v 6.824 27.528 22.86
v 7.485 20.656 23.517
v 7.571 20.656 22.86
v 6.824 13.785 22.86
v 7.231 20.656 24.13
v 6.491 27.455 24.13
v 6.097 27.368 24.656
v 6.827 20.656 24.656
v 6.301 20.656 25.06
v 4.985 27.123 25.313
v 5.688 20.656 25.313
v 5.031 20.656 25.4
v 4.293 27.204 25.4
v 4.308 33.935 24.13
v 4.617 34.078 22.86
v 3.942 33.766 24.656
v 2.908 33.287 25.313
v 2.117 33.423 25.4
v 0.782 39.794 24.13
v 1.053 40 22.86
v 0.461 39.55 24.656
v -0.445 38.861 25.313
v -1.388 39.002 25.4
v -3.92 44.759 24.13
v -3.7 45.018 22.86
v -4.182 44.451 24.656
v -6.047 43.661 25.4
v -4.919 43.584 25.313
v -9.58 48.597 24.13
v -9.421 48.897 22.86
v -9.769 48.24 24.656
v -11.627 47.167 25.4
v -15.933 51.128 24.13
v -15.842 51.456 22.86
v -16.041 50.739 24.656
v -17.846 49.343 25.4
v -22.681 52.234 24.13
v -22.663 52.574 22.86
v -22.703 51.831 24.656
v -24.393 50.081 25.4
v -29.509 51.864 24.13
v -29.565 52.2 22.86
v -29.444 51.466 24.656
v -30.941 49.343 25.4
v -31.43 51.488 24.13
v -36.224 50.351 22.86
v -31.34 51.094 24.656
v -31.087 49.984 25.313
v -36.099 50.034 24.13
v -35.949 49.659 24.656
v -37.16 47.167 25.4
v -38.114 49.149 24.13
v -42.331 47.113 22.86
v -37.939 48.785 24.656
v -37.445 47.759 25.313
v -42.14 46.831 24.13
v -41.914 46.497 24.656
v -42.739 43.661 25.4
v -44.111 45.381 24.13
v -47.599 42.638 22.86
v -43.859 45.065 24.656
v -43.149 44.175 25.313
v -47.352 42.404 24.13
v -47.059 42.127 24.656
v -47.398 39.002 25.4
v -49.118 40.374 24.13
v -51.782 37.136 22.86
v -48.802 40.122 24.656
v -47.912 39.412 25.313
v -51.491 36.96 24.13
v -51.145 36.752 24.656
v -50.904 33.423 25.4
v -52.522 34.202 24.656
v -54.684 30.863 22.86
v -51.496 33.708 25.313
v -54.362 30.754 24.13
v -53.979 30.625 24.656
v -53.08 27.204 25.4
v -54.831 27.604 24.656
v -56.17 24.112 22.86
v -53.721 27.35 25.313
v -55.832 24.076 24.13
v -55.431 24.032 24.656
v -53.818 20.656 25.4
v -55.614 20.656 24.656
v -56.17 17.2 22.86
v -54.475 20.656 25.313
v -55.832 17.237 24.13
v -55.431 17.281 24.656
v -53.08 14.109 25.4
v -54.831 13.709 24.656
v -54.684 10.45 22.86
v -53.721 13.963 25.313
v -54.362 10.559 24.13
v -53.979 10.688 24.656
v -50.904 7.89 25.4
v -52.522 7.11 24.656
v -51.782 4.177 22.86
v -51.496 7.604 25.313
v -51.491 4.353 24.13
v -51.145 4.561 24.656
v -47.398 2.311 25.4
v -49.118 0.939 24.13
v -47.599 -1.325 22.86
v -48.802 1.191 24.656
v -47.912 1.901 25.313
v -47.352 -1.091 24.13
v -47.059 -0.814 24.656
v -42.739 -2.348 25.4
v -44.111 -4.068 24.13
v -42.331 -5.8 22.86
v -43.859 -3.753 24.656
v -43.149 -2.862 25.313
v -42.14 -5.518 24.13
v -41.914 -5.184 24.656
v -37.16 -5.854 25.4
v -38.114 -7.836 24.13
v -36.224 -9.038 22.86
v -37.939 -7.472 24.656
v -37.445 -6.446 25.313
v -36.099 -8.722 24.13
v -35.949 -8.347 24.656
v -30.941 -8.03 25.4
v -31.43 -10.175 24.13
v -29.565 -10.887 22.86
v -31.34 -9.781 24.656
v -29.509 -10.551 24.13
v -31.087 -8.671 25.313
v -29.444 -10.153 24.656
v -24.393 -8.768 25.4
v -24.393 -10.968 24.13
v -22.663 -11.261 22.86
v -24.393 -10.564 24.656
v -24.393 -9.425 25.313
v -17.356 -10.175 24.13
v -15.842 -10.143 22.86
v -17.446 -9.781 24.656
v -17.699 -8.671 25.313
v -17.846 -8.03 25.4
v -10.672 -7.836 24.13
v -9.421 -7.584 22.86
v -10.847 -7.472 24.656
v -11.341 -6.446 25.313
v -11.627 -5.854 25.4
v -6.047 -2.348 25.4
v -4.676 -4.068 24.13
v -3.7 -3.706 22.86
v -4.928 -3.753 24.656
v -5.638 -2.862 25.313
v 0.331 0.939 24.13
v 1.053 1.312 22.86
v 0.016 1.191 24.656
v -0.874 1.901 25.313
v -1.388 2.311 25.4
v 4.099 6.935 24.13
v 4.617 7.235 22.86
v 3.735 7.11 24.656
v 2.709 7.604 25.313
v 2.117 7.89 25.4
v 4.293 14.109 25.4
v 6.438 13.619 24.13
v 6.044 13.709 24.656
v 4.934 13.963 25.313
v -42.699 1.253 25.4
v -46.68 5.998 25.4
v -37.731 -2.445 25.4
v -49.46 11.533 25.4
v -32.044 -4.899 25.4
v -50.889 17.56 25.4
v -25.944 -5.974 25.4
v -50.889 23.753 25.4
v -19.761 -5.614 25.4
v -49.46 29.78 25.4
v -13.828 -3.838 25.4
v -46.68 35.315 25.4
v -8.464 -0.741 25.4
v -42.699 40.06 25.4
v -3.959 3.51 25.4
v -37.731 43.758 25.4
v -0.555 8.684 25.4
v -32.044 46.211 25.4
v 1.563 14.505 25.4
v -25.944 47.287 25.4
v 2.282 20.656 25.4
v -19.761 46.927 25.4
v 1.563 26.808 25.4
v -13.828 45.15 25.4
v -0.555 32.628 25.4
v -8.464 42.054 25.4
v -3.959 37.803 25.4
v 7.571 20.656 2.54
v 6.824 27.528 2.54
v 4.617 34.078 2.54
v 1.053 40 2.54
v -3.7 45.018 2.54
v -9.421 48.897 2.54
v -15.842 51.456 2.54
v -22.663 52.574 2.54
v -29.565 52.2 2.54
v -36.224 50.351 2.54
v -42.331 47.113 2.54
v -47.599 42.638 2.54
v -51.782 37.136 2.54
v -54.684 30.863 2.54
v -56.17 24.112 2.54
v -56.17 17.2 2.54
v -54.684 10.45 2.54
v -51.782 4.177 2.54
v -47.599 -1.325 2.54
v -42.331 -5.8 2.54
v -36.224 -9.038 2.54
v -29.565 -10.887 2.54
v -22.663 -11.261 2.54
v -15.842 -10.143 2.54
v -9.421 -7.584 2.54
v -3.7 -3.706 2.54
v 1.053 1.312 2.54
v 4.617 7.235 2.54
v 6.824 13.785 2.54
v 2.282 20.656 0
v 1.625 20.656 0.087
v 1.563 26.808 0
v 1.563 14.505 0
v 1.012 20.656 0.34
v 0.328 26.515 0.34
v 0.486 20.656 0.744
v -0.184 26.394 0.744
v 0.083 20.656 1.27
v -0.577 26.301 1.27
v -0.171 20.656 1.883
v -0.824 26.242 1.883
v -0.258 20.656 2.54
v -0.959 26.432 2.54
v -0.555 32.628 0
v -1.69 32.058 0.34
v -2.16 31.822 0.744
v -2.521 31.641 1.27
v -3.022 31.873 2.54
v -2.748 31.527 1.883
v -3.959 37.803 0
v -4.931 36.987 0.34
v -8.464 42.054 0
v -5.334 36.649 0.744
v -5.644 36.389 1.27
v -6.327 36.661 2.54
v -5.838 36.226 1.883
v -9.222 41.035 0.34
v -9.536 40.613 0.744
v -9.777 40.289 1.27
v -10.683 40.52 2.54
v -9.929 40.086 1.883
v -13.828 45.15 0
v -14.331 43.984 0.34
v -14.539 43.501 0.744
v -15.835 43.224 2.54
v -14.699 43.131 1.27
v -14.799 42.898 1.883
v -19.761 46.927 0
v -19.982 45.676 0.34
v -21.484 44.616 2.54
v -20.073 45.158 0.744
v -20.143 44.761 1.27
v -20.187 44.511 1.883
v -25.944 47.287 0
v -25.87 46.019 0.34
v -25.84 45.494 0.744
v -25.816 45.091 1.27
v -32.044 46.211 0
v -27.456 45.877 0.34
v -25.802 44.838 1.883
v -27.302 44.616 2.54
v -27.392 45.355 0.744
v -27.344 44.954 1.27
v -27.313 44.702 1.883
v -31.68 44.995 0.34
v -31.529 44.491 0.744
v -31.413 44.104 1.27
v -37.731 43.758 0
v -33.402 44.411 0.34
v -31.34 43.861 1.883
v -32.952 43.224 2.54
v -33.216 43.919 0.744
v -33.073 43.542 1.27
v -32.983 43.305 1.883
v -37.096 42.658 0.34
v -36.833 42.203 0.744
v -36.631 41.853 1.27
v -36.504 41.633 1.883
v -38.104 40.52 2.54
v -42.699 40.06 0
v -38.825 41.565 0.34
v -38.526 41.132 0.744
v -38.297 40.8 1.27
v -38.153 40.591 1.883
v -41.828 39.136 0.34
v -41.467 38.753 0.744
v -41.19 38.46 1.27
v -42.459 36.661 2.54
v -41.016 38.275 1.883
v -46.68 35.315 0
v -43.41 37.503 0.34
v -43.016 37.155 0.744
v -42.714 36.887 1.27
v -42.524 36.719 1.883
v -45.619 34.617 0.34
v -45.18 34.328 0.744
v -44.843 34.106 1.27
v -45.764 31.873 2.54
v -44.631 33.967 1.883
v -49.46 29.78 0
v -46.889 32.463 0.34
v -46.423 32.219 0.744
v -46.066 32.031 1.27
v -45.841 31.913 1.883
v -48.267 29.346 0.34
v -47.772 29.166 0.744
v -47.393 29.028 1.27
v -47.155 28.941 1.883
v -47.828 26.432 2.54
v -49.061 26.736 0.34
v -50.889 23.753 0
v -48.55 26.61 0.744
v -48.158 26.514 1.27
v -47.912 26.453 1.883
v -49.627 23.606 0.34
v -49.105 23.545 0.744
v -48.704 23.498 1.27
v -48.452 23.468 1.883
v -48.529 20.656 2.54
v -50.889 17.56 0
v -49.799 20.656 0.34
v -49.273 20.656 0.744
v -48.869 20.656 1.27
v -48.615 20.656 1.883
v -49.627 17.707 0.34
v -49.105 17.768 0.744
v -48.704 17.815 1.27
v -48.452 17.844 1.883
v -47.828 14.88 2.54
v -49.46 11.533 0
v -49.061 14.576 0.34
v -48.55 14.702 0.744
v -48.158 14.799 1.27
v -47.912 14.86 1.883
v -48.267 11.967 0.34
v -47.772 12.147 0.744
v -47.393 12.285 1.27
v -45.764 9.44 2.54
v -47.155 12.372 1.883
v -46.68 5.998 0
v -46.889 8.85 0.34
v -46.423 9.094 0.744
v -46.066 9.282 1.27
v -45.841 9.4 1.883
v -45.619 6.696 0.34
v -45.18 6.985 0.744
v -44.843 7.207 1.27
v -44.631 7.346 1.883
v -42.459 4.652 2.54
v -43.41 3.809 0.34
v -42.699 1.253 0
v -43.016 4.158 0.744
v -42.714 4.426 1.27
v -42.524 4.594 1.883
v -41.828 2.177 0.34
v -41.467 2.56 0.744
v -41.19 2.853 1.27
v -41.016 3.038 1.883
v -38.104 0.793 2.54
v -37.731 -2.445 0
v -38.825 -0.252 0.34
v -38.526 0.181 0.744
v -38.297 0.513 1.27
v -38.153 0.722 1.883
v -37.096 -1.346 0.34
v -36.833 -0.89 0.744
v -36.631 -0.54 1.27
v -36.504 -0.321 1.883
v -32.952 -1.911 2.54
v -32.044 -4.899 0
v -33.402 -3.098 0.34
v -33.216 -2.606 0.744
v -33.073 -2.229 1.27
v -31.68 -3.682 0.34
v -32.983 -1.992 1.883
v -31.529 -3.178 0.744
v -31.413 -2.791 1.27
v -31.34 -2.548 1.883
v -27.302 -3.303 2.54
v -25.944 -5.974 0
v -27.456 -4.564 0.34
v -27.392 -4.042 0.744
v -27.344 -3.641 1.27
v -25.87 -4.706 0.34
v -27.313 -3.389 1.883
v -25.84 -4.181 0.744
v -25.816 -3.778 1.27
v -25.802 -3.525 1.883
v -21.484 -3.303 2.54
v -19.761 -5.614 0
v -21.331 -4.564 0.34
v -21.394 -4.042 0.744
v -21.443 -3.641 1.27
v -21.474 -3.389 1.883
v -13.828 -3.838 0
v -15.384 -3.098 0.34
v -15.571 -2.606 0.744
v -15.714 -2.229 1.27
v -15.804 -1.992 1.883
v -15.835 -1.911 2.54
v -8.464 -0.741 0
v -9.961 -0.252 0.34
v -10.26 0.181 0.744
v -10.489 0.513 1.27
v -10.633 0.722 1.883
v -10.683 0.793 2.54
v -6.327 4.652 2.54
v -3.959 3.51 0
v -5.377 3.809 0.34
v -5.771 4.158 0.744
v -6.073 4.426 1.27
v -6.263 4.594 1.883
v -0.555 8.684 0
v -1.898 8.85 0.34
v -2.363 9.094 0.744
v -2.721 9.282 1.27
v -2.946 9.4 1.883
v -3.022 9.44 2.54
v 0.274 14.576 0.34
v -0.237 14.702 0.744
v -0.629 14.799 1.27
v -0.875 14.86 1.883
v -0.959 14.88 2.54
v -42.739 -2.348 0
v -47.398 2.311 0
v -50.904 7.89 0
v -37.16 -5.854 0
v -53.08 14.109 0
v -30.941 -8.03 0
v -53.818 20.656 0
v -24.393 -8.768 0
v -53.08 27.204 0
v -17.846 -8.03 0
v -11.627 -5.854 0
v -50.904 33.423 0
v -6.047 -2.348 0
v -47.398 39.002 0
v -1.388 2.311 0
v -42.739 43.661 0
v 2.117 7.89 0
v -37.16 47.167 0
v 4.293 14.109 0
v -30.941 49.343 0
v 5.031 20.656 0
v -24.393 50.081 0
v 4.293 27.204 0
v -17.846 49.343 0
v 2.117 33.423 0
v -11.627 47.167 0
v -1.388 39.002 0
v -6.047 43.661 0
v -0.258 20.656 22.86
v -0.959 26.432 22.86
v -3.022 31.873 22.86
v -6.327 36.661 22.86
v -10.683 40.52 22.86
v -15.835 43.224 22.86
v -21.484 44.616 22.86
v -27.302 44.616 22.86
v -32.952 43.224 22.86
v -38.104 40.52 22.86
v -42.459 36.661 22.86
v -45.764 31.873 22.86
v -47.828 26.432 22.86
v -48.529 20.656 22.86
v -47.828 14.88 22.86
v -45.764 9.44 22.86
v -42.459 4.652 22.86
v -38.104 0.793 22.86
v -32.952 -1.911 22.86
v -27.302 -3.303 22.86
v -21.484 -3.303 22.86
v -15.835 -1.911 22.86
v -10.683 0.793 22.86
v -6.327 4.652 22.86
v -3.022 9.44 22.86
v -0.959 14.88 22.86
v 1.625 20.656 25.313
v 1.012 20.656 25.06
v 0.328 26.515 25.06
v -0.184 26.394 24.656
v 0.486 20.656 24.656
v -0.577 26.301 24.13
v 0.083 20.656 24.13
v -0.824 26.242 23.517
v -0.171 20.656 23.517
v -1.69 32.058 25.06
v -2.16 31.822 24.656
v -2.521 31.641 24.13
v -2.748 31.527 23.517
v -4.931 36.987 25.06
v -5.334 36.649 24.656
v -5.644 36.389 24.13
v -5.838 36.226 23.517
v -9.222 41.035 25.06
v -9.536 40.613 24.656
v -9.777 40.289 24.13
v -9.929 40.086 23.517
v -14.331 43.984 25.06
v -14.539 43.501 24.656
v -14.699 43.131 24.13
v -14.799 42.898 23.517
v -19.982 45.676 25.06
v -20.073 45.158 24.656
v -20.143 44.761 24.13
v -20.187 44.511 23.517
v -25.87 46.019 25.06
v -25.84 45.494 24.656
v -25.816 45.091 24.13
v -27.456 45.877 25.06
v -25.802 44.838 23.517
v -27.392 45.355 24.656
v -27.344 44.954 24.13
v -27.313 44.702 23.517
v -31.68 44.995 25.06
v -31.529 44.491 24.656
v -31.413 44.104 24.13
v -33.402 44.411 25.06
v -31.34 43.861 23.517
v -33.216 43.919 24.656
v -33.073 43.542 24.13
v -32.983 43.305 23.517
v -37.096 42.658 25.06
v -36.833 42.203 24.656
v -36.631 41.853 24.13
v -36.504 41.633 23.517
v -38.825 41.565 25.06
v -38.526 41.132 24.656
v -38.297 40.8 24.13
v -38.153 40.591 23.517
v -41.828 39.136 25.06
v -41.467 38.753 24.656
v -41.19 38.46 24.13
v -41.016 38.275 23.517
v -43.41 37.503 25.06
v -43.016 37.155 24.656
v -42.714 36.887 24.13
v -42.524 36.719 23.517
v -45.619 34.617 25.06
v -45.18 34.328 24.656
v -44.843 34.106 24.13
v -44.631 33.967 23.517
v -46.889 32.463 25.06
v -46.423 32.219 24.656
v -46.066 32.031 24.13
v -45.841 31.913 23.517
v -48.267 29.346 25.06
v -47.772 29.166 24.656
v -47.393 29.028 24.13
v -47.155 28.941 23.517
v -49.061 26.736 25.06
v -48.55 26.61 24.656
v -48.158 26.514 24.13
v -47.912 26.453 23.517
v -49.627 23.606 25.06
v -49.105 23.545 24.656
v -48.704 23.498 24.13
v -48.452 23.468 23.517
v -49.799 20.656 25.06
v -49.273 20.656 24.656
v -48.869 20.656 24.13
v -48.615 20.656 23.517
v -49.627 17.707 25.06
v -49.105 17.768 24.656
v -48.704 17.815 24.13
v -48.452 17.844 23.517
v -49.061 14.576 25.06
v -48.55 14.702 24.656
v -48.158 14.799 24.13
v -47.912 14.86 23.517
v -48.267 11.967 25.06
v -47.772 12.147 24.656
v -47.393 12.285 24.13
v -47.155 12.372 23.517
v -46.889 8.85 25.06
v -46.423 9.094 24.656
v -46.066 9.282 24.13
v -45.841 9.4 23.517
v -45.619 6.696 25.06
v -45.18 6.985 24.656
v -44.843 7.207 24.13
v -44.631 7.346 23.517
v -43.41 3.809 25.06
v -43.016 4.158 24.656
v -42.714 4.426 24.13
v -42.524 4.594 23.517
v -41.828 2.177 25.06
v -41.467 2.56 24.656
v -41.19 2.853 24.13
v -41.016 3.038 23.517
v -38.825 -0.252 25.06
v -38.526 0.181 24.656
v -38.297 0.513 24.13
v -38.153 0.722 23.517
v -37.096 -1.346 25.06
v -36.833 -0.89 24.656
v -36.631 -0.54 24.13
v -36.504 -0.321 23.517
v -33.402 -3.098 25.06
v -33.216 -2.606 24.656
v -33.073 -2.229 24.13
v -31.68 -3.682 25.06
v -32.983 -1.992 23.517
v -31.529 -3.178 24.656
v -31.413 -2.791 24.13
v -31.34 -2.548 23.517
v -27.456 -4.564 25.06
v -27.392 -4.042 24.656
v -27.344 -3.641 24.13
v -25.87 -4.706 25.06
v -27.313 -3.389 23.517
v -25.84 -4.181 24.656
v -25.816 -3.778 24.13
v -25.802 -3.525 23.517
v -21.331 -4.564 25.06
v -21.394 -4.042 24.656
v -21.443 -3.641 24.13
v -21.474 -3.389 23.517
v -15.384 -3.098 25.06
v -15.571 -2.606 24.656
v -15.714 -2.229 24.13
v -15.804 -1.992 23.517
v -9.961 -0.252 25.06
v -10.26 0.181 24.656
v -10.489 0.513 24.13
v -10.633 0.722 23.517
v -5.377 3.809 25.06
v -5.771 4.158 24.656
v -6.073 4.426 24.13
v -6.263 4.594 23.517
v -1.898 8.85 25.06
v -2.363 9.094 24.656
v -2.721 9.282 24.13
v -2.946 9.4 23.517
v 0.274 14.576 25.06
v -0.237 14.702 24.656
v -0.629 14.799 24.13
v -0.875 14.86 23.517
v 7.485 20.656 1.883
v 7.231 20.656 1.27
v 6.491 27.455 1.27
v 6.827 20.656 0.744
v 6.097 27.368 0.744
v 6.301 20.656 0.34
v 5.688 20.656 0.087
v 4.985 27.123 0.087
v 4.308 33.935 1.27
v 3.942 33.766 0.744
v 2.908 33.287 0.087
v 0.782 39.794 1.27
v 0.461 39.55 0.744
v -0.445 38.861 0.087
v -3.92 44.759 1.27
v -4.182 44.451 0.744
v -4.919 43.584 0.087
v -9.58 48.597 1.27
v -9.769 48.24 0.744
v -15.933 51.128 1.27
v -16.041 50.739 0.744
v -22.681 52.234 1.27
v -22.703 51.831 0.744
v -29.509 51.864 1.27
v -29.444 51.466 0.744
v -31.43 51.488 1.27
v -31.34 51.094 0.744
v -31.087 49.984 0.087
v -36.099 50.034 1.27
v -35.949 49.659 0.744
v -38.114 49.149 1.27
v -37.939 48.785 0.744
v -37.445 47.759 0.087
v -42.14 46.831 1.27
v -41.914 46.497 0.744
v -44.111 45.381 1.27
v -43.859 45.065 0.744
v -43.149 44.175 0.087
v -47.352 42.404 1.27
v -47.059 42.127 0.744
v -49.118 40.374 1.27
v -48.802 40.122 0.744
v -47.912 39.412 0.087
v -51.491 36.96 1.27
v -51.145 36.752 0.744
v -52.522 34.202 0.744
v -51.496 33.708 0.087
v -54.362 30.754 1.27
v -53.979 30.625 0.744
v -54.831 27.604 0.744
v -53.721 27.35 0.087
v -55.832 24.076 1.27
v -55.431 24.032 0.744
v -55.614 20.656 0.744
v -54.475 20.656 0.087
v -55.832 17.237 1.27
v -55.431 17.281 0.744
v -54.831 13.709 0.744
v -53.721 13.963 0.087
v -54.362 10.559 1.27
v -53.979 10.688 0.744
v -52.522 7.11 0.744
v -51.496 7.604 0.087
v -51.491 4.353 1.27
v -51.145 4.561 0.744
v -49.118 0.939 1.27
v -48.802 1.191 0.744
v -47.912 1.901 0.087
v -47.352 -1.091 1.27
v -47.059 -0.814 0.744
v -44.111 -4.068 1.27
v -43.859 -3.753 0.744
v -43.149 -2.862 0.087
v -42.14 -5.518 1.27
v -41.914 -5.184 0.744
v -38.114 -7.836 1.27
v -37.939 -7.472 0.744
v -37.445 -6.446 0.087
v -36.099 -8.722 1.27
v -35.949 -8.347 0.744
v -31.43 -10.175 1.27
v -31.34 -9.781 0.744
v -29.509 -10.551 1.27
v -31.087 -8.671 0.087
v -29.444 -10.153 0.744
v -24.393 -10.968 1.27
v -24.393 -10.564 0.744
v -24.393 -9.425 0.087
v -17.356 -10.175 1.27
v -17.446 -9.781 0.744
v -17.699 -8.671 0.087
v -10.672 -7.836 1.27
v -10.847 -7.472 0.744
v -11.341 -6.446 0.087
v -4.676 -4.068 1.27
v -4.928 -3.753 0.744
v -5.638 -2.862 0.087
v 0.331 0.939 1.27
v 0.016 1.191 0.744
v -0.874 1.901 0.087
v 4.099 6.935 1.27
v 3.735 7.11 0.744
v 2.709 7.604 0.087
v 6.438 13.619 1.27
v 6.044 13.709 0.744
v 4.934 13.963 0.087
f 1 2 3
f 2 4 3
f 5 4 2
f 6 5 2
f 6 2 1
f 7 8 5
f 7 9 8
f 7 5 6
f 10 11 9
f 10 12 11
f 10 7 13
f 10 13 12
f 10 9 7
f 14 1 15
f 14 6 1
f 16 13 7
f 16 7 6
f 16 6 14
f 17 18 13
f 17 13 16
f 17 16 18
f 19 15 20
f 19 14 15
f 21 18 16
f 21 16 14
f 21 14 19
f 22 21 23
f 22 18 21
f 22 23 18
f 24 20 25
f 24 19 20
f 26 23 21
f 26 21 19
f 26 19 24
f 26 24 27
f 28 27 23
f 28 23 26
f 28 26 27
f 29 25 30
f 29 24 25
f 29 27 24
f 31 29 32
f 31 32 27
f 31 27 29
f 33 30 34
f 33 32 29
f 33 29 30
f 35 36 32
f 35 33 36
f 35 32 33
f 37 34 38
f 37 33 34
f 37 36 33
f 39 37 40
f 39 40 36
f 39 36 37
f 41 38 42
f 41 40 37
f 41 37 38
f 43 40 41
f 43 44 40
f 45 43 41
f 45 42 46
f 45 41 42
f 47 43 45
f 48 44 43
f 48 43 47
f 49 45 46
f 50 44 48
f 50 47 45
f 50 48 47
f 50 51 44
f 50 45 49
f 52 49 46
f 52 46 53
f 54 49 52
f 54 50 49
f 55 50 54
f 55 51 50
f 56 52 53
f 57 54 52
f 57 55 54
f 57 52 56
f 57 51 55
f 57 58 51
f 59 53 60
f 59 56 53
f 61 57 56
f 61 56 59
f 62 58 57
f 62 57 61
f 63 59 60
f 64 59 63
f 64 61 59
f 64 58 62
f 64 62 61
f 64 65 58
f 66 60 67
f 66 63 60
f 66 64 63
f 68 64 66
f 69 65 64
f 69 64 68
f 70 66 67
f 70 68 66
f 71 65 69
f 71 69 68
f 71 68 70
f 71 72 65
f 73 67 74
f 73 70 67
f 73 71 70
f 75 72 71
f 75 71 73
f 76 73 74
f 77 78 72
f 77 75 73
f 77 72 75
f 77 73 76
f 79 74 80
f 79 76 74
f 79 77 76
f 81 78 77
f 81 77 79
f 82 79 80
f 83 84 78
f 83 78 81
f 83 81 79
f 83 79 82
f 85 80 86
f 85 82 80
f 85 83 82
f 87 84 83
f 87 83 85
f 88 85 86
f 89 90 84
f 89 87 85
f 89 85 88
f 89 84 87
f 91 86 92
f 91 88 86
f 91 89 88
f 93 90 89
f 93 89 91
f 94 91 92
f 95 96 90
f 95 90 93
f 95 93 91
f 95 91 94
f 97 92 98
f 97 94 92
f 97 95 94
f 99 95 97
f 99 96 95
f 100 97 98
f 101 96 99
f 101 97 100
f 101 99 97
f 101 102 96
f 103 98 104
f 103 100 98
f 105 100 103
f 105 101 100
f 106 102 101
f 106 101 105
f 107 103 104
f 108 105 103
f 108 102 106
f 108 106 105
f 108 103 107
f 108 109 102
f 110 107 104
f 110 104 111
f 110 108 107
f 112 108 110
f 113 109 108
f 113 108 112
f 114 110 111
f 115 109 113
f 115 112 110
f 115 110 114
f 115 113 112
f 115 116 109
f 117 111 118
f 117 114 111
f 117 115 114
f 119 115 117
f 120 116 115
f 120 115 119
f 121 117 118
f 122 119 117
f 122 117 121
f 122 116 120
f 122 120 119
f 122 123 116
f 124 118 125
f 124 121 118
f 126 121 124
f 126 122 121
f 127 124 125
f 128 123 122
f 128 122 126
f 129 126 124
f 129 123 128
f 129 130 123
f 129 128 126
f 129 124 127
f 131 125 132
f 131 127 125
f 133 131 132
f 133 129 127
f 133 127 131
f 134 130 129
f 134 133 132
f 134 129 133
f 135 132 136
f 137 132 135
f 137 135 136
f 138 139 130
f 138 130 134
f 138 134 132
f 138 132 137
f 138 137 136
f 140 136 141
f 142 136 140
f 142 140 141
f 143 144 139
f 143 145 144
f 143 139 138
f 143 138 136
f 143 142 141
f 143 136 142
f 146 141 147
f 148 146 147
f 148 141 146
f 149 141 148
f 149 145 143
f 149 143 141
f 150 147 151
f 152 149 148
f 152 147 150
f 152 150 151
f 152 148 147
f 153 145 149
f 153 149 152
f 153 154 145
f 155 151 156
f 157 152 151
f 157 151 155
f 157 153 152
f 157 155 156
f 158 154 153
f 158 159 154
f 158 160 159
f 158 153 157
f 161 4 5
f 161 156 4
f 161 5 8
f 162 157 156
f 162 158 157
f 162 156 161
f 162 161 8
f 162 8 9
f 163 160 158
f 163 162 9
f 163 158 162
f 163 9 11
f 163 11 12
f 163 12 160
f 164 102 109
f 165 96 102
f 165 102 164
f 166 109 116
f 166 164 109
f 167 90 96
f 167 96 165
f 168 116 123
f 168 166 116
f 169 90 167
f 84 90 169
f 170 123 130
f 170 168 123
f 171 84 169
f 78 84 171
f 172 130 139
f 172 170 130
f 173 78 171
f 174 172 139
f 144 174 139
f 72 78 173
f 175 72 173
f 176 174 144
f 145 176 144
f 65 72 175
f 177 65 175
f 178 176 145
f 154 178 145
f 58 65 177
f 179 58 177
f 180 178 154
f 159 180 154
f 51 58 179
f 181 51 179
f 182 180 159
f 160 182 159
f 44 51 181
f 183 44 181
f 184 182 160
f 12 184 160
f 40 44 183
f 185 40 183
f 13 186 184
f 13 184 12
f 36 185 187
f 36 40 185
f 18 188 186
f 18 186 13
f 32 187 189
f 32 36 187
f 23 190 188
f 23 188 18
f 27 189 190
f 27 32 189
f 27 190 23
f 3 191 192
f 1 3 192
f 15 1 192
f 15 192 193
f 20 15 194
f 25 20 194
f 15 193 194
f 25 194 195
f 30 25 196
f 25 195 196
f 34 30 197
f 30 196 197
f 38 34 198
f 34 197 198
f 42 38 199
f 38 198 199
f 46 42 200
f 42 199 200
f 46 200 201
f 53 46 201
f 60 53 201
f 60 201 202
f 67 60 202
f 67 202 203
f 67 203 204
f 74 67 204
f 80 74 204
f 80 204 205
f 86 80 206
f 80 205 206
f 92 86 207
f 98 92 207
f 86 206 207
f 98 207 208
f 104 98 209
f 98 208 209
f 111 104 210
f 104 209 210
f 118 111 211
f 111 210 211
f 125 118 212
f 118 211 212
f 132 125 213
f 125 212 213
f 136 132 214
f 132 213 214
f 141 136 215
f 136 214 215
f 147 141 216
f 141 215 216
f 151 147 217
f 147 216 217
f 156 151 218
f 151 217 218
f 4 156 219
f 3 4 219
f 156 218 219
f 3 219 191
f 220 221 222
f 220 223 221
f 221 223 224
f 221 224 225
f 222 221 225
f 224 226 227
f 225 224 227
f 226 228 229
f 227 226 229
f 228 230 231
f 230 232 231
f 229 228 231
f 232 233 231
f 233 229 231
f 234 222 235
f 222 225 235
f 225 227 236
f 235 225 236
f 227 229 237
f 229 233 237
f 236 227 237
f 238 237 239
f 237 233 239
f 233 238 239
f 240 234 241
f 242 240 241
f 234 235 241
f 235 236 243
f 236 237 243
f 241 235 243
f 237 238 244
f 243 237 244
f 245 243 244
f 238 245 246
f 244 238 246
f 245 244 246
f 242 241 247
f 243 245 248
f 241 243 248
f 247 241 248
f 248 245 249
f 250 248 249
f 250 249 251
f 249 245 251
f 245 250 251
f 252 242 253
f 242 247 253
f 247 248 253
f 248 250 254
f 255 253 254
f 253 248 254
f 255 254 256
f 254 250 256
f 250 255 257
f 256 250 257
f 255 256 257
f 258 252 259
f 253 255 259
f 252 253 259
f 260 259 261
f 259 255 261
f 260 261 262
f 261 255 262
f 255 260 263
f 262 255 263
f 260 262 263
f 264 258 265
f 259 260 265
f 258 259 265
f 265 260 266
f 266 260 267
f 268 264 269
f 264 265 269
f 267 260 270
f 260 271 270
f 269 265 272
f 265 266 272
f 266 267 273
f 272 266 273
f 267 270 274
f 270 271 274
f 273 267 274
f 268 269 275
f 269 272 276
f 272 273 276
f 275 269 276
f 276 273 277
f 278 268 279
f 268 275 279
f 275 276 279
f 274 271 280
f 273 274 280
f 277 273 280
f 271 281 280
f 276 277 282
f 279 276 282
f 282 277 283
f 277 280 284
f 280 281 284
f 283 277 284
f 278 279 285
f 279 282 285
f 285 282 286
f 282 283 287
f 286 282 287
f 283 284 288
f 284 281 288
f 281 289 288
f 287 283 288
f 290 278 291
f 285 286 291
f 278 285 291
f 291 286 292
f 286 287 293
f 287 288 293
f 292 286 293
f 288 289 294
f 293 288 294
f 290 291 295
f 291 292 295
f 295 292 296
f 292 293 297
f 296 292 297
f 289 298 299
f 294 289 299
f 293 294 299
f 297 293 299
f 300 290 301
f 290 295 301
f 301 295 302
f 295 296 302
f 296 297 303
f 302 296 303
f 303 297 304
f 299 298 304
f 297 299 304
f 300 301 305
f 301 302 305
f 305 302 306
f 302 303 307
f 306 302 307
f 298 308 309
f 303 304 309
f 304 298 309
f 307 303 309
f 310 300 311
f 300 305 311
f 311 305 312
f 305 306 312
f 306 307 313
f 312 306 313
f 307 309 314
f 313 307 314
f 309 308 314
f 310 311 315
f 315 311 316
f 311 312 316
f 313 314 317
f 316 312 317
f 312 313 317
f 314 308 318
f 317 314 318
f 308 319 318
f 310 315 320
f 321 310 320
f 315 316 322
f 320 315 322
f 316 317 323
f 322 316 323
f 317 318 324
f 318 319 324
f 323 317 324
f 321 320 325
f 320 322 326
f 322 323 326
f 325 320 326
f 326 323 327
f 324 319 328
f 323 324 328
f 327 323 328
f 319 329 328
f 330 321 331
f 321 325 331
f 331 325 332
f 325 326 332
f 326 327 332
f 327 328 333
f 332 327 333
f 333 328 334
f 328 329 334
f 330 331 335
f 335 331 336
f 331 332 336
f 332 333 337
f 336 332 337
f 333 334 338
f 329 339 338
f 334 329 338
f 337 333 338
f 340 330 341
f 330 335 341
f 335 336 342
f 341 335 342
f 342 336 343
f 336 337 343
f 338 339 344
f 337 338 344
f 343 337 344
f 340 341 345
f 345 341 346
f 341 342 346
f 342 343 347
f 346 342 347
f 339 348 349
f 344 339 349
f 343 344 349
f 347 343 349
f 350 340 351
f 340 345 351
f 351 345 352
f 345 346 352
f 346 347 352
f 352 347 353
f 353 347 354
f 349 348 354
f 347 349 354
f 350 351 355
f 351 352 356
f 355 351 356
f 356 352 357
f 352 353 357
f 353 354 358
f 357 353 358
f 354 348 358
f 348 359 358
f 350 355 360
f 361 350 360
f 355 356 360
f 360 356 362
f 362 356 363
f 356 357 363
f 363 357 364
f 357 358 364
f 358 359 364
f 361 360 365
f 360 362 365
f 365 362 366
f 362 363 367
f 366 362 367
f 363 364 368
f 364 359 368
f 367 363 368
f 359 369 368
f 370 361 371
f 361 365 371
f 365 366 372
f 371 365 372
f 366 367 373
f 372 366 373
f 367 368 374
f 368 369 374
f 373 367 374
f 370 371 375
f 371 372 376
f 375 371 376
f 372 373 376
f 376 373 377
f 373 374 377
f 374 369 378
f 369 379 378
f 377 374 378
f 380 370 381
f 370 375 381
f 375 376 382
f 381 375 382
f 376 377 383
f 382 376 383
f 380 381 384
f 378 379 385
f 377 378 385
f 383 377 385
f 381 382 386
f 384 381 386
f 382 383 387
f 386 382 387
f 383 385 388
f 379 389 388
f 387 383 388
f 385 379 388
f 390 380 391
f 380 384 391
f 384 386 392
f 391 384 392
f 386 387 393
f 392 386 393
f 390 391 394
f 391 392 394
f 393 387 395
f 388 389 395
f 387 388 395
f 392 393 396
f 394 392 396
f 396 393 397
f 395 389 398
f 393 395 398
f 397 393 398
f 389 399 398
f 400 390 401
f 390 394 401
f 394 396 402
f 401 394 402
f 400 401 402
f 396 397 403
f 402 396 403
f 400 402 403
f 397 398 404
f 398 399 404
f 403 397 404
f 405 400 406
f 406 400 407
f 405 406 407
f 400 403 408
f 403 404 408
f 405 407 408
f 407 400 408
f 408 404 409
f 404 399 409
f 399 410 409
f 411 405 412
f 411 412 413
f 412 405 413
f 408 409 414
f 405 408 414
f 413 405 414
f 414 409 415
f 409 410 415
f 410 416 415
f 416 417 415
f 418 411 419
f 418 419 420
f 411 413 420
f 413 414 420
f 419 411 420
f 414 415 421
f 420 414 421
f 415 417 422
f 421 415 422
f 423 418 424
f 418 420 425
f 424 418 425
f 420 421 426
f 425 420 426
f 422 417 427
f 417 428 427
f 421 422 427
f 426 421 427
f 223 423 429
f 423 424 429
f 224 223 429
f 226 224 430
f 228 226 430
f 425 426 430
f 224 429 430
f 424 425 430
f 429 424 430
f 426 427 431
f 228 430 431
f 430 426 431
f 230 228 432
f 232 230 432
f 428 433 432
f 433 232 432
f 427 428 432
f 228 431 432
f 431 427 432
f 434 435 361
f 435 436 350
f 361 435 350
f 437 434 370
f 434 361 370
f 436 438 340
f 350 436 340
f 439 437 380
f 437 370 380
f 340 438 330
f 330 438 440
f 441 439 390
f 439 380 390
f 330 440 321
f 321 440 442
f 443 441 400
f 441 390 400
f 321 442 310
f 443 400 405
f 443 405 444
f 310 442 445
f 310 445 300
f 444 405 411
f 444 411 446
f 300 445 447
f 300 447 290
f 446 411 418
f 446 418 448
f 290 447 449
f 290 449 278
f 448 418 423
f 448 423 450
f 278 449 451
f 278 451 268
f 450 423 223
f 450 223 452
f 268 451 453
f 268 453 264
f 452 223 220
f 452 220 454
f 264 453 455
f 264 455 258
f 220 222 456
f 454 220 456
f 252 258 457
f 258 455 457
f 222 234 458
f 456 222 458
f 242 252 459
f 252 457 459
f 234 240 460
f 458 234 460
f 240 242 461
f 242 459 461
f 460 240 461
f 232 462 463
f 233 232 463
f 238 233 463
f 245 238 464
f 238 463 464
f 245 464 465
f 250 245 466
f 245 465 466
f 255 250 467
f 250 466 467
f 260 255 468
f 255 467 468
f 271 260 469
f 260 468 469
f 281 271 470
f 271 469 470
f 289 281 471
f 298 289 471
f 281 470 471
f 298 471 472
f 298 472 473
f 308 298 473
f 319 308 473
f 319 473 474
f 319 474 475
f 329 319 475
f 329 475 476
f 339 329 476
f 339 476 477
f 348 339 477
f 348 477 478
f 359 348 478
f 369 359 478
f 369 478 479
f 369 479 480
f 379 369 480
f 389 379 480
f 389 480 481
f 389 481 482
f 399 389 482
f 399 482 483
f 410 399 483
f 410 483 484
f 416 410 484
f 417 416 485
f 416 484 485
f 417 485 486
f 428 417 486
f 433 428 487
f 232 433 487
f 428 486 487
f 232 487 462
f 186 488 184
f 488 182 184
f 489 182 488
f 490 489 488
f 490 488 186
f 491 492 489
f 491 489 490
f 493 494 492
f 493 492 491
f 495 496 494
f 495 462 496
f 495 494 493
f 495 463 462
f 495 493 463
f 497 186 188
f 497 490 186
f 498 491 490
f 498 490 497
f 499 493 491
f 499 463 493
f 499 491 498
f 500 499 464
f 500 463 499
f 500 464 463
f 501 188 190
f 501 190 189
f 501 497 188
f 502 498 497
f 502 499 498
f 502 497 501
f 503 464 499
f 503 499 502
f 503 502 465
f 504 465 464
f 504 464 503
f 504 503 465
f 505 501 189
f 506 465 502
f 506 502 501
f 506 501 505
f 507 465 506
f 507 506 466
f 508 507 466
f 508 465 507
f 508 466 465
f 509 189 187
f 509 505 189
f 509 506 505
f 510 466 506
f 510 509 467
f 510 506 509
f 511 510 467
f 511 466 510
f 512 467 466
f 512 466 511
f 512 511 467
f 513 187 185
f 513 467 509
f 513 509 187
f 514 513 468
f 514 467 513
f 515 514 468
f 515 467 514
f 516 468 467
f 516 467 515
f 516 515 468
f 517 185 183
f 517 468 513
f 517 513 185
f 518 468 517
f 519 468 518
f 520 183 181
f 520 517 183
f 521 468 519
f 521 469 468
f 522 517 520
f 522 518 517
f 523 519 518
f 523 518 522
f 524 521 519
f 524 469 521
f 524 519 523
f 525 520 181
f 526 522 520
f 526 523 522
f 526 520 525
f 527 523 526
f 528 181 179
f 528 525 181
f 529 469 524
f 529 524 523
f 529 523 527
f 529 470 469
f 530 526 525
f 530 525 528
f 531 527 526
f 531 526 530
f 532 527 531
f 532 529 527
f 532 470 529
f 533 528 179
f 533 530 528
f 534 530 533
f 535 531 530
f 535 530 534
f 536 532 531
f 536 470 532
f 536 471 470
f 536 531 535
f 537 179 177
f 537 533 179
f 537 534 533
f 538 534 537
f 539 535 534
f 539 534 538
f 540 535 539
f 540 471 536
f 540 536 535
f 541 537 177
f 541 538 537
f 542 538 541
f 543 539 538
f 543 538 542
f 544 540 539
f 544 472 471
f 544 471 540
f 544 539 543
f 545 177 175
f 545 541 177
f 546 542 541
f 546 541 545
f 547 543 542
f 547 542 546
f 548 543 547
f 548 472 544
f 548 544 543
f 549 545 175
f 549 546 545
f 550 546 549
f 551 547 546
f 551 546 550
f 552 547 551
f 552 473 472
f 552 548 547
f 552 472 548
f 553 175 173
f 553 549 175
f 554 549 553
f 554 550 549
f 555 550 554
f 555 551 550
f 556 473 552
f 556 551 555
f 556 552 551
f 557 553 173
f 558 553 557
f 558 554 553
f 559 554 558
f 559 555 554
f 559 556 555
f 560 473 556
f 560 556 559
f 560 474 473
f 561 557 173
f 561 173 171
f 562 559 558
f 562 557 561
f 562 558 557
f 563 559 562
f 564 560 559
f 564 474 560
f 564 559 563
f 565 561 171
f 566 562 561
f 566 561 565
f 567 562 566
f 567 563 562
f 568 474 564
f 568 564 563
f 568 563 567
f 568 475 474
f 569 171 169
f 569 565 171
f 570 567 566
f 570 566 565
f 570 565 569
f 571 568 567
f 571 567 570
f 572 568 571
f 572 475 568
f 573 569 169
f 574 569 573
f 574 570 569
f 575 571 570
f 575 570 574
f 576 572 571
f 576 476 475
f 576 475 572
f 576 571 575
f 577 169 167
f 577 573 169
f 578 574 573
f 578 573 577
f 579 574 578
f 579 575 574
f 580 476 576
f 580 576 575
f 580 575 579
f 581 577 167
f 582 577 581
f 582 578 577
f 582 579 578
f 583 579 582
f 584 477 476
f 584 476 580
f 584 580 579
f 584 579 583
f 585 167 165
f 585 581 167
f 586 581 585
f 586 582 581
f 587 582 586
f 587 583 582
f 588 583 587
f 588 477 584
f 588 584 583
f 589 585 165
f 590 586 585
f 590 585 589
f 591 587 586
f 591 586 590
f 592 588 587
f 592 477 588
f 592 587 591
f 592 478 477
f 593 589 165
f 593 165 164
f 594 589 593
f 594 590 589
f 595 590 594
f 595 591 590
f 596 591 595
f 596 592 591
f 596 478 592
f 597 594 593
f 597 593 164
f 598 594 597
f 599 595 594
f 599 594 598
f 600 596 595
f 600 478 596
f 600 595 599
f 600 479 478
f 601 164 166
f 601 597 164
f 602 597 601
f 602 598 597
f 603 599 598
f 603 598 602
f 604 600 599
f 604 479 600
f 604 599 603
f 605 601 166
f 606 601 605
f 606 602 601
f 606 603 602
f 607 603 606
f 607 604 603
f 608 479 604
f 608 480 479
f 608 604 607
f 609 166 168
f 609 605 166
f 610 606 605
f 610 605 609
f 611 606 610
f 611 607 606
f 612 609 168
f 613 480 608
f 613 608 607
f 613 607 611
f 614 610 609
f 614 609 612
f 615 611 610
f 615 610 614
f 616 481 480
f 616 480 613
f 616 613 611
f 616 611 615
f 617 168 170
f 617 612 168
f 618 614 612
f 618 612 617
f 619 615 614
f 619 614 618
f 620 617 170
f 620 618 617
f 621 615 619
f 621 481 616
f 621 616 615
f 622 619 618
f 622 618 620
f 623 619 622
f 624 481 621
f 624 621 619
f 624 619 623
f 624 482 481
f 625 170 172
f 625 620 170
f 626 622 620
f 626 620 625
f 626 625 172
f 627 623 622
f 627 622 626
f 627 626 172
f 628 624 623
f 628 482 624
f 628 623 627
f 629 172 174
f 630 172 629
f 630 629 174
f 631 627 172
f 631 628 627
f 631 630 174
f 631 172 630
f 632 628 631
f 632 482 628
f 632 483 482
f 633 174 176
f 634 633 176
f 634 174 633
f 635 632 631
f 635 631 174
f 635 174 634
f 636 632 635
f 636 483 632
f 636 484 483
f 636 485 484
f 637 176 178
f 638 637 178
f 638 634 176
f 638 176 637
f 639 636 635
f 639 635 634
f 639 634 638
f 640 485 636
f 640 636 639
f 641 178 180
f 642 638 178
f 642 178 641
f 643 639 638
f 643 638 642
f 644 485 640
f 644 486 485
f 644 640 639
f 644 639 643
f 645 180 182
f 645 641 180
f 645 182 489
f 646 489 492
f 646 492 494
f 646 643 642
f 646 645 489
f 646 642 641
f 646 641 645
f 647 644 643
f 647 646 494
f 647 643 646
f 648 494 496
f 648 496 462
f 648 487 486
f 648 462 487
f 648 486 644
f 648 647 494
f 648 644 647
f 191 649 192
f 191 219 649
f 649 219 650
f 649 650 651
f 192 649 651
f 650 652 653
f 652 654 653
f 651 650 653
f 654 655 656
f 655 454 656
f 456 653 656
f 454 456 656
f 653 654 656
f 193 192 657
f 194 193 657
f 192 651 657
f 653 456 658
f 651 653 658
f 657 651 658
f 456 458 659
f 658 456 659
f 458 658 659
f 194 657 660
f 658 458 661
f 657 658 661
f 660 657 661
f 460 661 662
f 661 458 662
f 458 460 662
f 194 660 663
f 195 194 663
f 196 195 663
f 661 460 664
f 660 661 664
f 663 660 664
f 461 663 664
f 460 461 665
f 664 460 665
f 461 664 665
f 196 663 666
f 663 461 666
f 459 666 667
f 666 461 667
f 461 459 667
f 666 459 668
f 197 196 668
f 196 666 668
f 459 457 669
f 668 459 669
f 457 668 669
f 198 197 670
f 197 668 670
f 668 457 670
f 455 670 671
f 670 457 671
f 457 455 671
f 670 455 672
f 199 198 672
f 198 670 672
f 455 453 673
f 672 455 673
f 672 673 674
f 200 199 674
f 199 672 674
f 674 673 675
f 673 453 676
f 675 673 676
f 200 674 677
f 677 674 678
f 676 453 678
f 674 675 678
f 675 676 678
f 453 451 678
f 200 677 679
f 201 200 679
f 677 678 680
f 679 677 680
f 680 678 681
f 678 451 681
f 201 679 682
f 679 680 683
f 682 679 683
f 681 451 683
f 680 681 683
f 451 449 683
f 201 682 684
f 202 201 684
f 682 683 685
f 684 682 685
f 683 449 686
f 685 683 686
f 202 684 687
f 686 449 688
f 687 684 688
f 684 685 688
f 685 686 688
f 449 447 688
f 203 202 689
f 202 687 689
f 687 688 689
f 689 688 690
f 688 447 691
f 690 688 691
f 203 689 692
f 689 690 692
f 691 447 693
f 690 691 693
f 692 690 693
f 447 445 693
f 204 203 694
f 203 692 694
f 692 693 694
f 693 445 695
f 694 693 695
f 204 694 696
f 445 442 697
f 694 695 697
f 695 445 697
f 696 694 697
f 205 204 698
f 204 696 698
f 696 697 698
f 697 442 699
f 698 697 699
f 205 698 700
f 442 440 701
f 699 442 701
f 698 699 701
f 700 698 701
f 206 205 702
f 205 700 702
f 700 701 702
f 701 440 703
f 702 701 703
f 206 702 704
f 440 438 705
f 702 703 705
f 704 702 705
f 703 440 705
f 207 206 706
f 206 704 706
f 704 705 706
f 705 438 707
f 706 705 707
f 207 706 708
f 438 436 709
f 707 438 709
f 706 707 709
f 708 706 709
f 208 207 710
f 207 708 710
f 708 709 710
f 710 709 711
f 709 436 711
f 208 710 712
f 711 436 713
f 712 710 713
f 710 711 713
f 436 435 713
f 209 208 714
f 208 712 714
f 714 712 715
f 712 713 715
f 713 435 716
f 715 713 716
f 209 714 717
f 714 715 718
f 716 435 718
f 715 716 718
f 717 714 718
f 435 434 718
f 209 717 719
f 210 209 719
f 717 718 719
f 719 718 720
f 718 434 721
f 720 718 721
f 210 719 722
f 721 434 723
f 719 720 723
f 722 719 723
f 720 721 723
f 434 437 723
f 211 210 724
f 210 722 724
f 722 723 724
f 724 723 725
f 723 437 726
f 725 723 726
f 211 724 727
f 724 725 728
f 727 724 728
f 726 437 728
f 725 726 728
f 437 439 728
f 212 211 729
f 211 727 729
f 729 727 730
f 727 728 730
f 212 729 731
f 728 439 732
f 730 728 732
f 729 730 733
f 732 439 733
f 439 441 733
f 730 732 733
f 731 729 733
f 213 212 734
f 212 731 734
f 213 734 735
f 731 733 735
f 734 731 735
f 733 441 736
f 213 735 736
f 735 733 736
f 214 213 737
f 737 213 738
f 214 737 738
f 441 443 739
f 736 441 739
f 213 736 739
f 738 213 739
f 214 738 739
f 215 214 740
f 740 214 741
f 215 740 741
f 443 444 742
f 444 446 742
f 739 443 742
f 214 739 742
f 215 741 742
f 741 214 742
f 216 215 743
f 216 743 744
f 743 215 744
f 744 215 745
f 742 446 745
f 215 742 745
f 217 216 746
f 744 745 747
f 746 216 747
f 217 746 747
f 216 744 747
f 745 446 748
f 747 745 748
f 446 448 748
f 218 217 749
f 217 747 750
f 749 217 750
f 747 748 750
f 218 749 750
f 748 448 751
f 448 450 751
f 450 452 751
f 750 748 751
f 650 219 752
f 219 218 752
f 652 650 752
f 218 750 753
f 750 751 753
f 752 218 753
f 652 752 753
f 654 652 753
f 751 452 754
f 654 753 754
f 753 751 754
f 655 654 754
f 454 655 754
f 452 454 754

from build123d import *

# Parameters (mm, degrees)
F0_R     = 31.964339
F1_DEPTH = 25.4
F2_R     = 24.135633
F3_DEPTH = 25.401
F4_R     = 2.54


with BuildPart() as f1:
    # F0 (on Top) → F1 (new body)
    with BuildSketch(Plane.XY):
        with Locations((-24.393266, 20.656416)):
            Circle(F0_R)
    extrude(amount=F1_DEPTH)

    # F2 (on face) → F3 (cut, through all)
    with BuildSketch(Plane.XY.offset(25.4)):
        with Locations((-24.393266, 20.656416)):
            Circle(F2_R)
    extrude(amount=-F3_DEPTH, mode=Mode.SUBTRACT)

    # F4
    f4_edges = [f1.edges().sort_by_distance(p)[0] for p in [
        (-56.357605, 20.656416, 25.4),
        (-56.357605, 20.656416, 0),
        (7.571073, 20.656416, 12.7),
        (-48.528899, 20.656416, 25.4),
        (-48.528899, 20.656416, 0),
    ]]
    fillet(f4_edges, radius=F4_R)


solid = f1.part
